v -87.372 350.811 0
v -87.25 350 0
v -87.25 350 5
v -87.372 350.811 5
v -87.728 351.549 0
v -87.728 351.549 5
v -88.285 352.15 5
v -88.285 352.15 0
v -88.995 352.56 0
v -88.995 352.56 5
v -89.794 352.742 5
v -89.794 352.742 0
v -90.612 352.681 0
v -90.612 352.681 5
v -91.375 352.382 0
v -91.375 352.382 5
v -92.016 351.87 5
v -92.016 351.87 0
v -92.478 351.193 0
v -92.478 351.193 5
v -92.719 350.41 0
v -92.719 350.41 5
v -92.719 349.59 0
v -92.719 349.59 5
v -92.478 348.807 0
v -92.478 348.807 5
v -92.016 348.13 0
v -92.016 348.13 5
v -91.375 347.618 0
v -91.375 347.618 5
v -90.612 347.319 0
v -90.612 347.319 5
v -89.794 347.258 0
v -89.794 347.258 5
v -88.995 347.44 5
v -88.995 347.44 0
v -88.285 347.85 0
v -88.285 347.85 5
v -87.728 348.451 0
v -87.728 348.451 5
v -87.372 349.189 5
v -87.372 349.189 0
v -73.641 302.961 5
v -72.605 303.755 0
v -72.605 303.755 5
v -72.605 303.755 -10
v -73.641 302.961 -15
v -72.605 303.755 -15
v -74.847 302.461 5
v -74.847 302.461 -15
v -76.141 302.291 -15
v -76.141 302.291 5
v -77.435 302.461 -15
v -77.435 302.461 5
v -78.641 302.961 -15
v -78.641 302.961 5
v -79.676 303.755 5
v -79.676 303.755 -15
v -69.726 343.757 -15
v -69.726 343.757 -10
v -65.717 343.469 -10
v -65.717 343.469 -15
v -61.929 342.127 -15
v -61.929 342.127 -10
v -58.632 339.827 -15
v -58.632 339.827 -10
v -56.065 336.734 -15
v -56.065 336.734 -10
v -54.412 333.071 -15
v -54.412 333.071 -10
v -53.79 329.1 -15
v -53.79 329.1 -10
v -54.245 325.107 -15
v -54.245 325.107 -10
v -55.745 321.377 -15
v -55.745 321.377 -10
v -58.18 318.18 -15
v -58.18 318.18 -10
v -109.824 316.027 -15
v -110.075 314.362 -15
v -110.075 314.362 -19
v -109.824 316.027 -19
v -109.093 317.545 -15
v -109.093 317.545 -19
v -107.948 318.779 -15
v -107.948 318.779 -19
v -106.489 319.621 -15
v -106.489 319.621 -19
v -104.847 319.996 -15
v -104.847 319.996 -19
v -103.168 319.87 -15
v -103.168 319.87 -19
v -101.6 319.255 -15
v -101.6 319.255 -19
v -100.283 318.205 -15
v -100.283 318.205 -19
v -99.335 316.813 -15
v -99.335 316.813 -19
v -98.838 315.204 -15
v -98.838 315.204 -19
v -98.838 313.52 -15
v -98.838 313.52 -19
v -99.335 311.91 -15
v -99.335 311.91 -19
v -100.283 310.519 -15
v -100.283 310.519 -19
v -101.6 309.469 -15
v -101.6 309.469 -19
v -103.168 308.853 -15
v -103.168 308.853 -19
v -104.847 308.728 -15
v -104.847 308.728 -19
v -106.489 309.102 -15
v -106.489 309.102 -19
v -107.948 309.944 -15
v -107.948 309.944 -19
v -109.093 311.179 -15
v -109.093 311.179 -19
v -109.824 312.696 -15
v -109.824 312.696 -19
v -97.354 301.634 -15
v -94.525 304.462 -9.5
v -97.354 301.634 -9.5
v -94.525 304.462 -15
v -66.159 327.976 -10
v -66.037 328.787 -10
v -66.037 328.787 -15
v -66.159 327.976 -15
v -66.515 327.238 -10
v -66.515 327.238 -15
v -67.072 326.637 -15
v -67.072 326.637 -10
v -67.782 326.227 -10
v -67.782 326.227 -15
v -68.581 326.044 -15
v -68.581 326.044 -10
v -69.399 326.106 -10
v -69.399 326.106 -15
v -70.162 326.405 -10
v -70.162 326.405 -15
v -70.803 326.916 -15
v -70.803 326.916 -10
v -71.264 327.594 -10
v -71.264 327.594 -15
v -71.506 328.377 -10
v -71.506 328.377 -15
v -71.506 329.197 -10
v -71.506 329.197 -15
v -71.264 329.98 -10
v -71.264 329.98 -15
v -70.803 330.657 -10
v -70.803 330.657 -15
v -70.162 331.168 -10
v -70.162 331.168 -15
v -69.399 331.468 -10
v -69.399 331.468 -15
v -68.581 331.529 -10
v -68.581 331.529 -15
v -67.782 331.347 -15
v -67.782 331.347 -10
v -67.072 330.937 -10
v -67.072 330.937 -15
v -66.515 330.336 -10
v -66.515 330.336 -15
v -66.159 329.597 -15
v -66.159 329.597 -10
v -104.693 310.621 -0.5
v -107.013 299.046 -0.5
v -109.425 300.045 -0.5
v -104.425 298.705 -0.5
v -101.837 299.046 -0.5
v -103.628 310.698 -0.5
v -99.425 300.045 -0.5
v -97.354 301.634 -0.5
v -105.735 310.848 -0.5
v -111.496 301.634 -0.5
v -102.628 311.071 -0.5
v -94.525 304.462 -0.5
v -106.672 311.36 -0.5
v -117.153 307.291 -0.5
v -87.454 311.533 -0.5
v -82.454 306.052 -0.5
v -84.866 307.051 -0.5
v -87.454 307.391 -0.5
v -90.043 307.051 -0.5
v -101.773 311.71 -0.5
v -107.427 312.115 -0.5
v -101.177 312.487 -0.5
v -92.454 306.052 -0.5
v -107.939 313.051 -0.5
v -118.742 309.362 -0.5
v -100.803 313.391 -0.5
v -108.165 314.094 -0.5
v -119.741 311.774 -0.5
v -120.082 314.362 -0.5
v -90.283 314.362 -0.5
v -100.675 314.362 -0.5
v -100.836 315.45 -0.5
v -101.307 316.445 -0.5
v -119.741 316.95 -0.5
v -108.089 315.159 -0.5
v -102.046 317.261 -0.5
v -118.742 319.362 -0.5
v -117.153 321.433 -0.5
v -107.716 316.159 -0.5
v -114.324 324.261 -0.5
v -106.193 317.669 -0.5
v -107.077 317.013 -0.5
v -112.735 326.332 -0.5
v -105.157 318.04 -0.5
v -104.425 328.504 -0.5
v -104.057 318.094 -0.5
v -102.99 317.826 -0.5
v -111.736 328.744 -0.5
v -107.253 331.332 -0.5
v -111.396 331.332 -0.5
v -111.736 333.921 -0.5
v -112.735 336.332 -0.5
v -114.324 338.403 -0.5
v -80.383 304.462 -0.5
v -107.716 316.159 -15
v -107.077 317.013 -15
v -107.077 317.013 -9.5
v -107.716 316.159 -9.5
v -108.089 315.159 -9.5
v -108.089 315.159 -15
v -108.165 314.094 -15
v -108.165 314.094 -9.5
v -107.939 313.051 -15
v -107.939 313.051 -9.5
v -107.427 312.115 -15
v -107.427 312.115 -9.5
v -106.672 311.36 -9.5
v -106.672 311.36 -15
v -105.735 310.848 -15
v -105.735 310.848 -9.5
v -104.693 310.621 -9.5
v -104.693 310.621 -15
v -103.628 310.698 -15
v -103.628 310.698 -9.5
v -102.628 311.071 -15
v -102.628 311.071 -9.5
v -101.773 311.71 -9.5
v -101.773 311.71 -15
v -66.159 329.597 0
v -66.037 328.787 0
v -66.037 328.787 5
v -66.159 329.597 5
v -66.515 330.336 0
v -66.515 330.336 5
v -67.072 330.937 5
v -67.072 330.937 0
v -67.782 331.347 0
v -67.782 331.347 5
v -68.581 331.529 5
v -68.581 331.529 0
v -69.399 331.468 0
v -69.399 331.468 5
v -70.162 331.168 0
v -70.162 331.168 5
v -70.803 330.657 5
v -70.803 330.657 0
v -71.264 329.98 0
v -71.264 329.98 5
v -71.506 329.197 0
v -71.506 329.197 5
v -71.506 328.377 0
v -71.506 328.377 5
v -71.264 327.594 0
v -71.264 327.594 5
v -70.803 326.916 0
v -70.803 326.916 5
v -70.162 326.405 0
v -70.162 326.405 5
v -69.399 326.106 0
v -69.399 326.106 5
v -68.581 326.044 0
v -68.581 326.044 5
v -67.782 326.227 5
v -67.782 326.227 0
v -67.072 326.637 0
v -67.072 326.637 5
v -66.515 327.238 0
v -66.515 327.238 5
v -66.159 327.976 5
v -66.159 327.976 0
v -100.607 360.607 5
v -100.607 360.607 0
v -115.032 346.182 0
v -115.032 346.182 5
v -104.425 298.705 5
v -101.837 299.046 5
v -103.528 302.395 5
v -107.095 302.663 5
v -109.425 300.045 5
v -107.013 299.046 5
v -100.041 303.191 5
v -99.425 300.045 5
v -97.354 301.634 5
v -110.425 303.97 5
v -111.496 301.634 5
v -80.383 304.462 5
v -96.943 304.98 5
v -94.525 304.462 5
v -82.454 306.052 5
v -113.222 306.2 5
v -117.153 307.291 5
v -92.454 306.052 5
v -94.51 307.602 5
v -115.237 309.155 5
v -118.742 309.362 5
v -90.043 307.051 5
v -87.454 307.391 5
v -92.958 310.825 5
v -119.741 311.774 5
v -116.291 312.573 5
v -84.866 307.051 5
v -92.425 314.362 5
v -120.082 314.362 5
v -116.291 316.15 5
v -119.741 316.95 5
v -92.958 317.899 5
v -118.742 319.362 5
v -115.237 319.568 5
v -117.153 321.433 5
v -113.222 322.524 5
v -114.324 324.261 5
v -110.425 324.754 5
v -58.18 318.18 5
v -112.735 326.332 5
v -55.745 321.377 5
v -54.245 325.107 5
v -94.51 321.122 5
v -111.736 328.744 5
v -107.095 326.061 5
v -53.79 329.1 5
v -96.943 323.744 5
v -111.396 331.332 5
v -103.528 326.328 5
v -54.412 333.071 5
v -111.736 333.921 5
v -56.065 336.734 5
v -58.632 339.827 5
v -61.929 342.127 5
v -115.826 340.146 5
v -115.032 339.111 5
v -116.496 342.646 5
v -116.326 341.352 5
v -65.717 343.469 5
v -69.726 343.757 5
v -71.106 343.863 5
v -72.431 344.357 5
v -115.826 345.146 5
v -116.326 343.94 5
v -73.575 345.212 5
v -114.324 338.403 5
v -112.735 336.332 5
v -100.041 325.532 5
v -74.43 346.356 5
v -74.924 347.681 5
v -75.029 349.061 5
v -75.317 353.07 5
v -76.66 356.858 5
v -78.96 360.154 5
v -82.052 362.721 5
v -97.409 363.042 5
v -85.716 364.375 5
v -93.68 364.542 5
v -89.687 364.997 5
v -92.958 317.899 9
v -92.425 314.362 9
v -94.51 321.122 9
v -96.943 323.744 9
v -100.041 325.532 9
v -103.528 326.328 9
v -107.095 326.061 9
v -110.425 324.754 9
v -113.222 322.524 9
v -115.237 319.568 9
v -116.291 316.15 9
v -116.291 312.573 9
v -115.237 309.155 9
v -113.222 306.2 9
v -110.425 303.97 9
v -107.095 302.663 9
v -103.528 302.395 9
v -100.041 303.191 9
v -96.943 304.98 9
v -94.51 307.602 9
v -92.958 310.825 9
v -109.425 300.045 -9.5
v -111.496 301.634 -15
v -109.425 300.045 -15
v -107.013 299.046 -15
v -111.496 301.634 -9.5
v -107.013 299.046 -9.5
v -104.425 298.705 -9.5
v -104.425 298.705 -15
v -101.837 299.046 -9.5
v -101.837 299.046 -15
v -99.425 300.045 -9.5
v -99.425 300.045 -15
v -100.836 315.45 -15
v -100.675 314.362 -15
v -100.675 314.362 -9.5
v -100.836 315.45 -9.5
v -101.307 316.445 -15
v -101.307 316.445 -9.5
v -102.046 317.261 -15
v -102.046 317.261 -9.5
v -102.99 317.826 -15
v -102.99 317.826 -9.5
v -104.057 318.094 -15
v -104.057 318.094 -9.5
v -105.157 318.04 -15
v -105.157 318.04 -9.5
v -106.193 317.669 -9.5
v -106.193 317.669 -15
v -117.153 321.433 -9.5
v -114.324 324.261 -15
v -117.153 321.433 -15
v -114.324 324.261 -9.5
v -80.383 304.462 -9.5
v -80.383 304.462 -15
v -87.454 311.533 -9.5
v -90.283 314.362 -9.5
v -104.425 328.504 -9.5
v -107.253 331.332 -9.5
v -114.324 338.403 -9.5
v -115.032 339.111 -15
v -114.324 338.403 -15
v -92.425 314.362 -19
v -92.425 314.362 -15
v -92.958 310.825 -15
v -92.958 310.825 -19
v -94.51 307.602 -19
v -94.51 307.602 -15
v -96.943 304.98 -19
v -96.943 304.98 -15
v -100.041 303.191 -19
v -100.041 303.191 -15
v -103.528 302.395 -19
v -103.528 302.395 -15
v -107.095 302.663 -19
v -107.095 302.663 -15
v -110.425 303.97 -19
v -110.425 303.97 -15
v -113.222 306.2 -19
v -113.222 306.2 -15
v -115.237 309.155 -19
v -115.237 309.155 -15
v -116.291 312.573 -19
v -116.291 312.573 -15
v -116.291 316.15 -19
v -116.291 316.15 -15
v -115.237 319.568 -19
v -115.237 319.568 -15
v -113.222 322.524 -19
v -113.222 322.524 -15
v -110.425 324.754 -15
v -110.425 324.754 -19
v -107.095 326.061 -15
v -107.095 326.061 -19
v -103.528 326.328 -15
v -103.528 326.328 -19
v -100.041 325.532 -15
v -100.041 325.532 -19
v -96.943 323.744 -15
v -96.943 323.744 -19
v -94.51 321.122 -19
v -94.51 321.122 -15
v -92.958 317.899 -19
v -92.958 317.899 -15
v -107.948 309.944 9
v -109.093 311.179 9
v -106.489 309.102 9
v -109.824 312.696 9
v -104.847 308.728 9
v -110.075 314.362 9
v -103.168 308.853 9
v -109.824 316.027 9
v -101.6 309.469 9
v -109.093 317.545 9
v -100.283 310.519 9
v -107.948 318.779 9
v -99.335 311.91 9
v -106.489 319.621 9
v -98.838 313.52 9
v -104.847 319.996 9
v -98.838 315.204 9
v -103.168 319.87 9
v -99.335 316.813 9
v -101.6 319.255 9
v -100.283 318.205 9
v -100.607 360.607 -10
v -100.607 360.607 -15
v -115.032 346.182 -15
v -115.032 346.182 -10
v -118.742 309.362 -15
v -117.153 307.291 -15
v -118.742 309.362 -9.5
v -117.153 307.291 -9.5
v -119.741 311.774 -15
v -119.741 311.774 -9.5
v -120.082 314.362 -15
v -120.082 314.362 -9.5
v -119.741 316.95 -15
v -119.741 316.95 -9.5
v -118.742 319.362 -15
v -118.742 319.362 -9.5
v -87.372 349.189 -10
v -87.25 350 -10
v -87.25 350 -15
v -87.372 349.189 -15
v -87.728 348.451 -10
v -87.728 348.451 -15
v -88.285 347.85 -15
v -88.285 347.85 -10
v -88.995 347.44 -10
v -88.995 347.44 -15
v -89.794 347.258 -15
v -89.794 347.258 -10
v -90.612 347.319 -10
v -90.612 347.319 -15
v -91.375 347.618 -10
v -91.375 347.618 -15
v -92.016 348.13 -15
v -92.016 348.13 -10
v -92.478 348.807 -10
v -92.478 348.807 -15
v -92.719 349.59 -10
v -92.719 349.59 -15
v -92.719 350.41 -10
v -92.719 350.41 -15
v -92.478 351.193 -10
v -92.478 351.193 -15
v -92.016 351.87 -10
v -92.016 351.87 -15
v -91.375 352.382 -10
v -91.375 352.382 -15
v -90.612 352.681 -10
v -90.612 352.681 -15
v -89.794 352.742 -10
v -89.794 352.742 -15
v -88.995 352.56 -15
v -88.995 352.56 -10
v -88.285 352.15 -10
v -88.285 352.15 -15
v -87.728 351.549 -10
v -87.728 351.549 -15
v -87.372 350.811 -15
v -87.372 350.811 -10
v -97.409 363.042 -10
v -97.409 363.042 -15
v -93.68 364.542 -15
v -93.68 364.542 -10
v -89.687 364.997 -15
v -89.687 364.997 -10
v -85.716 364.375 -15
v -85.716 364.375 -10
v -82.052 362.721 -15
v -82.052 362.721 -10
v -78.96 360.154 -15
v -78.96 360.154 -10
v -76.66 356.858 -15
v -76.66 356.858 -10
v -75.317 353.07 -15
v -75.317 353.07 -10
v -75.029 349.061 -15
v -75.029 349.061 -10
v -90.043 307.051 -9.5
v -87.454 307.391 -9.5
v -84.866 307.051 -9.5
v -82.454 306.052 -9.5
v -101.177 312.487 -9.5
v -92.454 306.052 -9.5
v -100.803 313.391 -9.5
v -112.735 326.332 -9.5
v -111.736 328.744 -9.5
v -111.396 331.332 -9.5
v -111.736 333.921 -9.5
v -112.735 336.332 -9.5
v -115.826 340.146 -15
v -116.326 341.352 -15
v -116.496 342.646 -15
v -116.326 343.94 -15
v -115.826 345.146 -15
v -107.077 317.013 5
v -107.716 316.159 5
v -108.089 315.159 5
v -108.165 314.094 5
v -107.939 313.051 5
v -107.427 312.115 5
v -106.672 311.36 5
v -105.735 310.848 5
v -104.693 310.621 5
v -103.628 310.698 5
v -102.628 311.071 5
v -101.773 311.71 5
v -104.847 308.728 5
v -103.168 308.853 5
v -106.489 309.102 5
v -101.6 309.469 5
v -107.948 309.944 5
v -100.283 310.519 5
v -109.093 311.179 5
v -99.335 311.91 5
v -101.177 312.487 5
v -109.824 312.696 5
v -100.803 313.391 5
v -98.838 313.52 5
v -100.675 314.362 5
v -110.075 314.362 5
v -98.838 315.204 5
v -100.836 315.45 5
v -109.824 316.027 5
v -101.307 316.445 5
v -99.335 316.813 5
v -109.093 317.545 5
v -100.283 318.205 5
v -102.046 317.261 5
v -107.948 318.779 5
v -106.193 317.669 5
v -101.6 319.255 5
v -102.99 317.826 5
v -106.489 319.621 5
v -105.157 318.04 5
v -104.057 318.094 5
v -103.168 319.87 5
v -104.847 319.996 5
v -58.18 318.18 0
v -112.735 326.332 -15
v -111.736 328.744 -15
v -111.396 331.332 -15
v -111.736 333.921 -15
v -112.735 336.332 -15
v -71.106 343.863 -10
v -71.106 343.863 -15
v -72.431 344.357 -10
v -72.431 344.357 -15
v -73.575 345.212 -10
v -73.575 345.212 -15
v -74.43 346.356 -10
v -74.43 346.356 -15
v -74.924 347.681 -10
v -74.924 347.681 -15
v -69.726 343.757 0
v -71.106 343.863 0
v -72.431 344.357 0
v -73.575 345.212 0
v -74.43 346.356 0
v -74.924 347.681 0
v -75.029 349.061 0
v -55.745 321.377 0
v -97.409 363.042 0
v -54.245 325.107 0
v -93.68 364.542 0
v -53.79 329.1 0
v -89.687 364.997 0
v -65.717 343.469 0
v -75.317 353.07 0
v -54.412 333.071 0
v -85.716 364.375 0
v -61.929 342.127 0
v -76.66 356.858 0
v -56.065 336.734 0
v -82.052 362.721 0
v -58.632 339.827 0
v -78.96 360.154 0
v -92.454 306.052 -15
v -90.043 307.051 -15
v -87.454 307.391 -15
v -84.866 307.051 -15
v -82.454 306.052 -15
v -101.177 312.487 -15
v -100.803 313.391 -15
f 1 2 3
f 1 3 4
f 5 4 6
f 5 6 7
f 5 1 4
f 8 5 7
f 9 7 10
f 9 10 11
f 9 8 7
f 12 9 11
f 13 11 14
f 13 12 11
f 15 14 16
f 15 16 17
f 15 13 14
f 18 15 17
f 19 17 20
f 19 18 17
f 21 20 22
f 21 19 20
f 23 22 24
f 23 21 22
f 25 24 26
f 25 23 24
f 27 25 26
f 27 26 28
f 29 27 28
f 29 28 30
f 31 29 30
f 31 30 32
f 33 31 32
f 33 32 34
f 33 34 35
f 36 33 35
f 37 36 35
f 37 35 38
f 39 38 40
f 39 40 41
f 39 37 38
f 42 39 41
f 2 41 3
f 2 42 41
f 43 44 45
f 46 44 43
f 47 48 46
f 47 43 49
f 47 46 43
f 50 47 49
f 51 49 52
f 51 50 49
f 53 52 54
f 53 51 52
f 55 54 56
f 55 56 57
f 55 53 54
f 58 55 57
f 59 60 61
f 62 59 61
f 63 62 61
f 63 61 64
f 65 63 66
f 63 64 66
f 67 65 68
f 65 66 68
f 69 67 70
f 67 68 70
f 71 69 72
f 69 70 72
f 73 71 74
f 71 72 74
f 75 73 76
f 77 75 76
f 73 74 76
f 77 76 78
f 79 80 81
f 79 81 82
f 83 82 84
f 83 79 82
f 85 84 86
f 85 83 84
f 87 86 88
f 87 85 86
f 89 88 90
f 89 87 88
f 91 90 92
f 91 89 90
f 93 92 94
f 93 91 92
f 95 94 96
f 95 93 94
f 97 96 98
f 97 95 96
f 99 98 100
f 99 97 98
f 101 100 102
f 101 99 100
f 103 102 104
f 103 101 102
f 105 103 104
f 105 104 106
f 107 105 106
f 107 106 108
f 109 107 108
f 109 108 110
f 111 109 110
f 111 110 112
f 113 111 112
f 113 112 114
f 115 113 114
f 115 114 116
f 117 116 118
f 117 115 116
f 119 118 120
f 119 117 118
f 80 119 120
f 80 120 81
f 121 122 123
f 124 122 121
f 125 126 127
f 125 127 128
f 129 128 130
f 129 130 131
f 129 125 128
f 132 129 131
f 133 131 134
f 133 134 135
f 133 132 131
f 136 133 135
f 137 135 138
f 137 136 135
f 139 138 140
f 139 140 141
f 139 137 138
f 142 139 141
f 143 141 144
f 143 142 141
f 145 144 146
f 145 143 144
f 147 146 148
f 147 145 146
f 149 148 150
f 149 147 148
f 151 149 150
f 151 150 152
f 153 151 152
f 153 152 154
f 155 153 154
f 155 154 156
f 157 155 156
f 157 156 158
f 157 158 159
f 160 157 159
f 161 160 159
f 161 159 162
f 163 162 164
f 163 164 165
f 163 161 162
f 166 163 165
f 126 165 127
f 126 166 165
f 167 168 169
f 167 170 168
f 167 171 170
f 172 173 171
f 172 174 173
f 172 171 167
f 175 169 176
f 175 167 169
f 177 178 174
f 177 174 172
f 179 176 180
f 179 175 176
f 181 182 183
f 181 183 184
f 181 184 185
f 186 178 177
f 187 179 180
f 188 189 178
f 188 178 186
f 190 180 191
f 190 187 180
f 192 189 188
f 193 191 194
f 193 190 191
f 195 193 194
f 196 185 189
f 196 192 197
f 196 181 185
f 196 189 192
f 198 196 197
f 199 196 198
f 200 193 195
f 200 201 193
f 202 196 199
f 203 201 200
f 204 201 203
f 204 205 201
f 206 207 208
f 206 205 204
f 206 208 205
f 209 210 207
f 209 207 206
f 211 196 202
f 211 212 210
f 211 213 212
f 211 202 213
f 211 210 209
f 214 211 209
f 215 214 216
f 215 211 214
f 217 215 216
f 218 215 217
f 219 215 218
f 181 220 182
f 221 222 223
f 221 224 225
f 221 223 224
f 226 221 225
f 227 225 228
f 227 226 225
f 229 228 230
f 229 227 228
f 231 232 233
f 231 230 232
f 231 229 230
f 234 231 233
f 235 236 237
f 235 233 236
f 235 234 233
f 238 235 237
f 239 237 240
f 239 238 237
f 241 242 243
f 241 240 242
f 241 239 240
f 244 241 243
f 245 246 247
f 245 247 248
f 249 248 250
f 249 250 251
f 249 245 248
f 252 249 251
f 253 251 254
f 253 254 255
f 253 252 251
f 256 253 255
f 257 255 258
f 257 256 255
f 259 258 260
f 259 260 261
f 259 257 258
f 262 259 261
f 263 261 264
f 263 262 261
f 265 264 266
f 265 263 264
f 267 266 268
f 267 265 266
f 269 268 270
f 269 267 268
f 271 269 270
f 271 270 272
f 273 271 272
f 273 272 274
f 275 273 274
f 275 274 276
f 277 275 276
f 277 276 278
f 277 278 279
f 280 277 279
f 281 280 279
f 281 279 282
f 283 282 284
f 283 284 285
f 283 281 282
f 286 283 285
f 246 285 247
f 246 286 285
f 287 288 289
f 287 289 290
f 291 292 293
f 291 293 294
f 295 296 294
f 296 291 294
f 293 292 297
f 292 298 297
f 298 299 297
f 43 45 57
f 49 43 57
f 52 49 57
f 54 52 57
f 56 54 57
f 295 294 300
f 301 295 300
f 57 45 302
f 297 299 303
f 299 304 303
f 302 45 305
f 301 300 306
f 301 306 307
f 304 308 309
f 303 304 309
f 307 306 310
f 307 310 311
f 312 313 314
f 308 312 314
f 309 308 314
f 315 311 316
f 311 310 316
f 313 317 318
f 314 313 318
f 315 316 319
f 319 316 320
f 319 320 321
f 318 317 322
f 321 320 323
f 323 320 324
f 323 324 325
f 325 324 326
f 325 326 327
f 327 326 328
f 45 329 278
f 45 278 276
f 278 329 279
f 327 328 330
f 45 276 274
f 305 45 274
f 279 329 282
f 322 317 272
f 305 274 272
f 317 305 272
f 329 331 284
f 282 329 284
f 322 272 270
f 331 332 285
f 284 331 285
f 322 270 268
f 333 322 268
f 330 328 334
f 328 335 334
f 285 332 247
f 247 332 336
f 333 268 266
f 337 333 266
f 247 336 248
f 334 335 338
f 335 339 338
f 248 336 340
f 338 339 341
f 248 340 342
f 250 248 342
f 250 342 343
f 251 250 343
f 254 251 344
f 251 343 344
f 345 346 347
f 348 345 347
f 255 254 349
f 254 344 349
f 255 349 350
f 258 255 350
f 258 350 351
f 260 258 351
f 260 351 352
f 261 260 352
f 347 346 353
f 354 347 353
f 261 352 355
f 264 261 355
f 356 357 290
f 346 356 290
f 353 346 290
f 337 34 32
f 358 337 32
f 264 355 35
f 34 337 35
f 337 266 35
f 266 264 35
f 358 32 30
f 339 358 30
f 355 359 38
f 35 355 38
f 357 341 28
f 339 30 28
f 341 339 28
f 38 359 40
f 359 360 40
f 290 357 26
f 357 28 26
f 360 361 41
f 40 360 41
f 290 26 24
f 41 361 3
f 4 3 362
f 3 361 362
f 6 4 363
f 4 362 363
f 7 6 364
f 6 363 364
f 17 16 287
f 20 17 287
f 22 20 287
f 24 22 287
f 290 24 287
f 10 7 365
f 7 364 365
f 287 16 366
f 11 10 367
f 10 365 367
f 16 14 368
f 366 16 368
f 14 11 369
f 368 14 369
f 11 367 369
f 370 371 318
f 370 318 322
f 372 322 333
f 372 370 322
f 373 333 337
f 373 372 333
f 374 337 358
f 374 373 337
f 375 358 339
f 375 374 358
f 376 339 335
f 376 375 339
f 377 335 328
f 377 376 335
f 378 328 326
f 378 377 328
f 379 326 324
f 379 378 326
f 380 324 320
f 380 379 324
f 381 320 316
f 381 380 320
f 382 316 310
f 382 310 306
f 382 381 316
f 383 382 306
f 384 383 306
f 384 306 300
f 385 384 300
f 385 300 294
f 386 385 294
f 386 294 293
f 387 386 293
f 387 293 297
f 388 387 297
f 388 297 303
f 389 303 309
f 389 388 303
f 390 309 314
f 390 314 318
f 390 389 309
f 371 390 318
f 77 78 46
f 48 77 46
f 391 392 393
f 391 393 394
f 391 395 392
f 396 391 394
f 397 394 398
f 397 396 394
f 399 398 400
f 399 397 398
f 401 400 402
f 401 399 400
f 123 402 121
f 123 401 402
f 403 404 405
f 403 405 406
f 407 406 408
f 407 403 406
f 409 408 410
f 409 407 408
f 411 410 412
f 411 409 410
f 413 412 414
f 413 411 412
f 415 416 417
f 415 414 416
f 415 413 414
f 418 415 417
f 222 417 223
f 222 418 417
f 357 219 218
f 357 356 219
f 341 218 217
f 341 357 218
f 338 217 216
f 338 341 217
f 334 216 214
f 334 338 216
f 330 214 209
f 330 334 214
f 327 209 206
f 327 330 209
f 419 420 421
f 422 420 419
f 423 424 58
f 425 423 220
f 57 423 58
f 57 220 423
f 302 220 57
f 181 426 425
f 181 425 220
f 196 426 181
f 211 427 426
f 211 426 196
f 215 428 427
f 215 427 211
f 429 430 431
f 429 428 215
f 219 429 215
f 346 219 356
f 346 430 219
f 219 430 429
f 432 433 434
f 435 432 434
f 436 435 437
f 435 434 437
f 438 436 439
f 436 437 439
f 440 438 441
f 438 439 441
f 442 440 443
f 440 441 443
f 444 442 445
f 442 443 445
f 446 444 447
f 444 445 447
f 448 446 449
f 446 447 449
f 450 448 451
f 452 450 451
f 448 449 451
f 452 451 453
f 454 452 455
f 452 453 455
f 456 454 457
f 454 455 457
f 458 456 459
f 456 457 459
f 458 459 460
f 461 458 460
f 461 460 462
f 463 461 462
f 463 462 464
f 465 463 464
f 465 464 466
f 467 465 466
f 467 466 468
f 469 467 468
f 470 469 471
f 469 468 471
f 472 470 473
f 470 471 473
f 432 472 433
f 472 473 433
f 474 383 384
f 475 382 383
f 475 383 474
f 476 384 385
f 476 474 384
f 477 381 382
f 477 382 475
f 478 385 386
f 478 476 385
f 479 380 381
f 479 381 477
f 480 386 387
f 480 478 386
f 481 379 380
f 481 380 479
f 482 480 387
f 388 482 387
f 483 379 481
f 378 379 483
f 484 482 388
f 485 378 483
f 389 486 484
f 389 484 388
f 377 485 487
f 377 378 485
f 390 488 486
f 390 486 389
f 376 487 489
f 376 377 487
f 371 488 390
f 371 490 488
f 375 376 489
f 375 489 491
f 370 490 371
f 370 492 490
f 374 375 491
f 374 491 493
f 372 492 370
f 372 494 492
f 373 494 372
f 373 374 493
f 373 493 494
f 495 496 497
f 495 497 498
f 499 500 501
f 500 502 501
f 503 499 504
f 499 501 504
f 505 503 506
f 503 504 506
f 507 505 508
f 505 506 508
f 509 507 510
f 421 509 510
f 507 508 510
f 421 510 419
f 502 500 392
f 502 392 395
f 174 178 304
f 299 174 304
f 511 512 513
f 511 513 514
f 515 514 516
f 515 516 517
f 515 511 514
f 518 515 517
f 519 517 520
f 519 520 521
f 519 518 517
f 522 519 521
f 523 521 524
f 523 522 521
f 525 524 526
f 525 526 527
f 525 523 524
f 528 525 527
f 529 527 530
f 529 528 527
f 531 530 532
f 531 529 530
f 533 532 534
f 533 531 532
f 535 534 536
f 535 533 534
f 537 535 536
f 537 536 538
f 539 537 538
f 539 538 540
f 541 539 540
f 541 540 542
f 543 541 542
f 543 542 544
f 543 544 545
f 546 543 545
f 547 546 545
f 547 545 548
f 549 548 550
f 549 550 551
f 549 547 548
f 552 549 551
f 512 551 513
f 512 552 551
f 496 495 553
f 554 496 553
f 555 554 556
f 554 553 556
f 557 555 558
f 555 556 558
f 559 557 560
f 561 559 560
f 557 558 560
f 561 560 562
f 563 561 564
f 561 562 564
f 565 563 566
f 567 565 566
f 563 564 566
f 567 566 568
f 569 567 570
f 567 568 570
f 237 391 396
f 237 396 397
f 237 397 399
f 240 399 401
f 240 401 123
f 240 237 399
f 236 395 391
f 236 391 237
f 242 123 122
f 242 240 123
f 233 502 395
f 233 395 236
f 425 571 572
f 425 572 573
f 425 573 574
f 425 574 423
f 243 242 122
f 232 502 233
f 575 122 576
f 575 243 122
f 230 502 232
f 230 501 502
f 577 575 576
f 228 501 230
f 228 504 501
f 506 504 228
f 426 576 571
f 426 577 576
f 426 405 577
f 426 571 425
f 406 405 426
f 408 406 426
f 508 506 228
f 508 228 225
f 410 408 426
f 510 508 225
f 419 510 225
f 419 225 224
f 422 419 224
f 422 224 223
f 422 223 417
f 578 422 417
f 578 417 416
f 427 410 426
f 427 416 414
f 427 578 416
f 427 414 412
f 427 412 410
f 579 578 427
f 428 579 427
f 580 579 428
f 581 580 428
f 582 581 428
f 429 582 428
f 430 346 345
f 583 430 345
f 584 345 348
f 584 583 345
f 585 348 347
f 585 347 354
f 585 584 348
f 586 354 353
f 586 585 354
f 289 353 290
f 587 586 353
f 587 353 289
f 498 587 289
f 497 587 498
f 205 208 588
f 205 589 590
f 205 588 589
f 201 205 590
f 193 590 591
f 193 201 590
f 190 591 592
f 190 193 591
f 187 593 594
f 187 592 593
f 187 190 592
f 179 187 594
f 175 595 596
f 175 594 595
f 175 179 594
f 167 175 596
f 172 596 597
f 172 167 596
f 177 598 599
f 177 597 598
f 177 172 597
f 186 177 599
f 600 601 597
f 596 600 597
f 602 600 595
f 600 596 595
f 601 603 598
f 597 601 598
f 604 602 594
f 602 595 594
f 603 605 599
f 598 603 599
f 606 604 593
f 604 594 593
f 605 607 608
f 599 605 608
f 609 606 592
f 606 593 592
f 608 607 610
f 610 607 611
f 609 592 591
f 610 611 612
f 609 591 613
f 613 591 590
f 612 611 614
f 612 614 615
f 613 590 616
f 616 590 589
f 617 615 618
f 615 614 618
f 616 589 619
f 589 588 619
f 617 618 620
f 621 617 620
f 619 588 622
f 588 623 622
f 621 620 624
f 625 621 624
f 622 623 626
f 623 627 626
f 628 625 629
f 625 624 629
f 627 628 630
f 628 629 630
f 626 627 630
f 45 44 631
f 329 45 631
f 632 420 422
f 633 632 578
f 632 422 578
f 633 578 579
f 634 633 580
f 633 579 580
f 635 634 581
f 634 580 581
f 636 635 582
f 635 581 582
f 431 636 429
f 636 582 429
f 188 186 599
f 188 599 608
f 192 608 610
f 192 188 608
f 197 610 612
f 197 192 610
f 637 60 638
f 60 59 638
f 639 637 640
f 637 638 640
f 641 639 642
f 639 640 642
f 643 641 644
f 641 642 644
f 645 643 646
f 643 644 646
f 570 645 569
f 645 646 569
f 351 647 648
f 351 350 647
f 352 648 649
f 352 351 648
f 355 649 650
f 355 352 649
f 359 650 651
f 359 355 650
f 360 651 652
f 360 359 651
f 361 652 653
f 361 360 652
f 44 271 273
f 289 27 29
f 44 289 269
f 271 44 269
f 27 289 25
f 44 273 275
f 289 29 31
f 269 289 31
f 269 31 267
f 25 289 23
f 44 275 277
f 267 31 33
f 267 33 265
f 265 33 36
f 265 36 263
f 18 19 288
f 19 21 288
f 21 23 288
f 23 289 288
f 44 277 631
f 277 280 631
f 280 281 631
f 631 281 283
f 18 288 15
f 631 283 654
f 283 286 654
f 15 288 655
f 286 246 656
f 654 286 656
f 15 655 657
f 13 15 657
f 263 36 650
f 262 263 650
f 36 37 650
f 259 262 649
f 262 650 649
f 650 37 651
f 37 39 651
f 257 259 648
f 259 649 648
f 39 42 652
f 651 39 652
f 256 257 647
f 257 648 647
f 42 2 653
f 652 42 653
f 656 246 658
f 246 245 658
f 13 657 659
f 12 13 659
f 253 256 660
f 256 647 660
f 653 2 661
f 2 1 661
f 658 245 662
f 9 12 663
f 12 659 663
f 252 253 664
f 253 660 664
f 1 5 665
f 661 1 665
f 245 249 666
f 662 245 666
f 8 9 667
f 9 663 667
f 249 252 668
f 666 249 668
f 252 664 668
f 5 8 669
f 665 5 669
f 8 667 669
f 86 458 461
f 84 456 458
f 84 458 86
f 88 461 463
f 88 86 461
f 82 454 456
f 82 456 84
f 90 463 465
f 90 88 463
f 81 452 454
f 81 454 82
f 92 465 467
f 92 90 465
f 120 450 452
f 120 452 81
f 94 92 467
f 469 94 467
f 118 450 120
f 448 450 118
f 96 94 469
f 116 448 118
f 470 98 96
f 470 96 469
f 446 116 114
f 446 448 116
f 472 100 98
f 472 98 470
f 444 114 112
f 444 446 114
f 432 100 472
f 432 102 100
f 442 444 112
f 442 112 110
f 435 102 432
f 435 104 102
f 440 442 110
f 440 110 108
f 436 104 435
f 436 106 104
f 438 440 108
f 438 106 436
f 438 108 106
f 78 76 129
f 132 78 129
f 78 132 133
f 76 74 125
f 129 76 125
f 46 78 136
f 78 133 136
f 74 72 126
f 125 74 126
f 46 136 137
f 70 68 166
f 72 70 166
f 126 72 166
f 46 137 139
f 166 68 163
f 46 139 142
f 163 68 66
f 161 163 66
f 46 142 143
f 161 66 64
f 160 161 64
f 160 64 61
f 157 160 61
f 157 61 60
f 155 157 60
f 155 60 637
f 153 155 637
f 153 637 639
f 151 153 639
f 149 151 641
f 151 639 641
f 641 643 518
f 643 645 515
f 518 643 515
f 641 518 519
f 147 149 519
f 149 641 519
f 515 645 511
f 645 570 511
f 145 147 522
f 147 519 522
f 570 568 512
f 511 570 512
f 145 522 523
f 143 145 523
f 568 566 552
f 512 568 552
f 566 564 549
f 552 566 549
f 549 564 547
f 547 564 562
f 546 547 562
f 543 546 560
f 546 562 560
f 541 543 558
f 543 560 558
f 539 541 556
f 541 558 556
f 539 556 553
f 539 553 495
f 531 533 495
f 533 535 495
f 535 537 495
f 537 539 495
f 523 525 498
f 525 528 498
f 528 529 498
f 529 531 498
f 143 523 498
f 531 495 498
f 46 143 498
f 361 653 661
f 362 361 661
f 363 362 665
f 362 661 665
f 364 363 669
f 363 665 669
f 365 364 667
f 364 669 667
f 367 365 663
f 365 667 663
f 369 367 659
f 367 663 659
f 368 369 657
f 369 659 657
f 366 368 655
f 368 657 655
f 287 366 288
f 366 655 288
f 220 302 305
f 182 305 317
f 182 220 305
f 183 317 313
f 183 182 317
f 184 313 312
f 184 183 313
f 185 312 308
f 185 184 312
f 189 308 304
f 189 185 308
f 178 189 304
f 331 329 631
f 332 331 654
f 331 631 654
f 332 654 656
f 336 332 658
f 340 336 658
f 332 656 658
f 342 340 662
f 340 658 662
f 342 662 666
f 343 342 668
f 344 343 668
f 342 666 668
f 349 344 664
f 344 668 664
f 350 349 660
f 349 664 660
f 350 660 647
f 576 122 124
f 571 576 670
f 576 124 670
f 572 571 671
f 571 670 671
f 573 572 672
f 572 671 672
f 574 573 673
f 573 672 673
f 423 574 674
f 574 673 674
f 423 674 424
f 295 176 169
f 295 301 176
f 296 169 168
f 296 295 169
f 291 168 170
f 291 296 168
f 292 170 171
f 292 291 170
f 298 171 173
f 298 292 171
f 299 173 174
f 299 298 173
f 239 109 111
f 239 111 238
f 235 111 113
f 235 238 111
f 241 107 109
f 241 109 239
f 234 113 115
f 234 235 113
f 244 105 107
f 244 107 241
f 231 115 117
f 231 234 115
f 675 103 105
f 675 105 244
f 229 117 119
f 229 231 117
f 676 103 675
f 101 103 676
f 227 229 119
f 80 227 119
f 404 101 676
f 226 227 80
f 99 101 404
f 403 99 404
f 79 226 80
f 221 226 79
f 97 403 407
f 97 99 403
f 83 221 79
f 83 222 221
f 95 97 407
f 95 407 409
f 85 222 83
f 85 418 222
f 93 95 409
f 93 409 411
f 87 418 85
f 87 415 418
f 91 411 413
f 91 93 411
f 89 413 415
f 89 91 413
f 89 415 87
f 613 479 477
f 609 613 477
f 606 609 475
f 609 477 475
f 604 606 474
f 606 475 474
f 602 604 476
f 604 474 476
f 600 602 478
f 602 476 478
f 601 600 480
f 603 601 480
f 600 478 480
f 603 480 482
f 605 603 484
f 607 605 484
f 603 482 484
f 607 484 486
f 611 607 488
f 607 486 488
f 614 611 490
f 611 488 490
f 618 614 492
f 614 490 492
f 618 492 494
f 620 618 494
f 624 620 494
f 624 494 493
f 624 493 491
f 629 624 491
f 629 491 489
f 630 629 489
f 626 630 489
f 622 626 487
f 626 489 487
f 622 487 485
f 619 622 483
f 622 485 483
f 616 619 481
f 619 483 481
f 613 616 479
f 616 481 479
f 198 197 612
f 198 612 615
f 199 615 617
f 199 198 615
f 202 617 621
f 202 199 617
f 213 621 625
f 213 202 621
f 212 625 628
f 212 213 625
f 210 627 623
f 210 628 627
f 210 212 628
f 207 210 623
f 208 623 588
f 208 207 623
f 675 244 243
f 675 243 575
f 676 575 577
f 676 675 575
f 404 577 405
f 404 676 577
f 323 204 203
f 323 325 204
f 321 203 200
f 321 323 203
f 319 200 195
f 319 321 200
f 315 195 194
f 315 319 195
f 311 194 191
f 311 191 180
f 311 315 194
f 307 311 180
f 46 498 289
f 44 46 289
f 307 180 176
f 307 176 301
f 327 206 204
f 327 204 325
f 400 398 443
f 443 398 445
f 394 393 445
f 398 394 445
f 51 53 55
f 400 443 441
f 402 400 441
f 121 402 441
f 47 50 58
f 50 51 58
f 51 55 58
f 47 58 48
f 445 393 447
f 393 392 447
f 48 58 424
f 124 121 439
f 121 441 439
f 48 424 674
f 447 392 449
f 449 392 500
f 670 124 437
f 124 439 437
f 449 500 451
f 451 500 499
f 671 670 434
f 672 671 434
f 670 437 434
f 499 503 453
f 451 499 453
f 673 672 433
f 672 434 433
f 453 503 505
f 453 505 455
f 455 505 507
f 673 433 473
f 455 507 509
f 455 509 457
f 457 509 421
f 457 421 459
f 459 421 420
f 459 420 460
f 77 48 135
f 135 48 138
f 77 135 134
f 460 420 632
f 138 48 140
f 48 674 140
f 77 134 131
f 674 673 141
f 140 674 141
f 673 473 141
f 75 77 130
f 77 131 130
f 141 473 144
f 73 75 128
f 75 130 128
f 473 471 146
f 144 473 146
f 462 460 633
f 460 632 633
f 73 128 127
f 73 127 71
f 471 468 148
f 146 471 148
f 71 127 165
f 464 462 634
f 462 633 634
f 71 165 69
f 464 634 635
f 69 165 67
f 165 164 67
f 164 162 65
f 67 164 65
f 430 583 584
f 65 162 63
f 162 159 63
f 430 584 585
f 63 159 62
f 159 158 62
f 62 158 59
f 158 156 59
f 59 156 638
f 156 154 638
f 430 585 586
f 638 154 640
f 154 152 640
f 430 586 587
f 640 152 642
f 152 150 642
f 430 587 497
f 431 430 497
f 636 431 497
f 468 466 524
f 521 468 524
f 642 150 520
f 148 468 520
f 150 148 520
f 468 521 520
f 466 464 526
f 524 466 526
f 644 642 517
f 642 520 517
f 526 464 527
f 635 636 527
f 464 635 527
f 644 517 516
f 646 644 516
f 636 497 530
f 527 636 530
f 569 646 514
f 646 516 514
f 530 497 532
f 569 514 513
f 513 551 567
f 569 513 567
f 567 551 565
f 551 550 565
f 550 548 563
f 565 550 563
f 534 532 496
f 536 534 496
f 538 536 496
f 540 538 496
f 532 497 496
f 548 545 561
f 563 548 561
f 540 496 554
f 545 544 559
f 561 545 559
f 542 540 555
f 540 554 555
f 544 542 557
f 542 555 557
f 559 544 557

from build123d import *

# Parameters (mm, degrees)
SKETCH2_R               = 2.75
BOSS_EXTRUDE2_DEPTH     = 5
SKETCH3_R               = 2.75
BOSS_EXTRUDE3_DEPTH     = 5
SKETCH4_W               = 20
SKETCH4_H               = 60
BOSS_EXTRUDE4_DEPTH     = 5
FILLET1_R               = 5
SKETCH5_W               = 8
SKETCH5_H               = 10
BOSS_EXTRUDE5_DEPTH     = 20
FILLET3_START           = -16
FILLET3_DEPTH           = 22
CUT_EXTRUDE1_DEPTH      = 385.295668221
CUT_EXTRUDE1_DEPTH_BACK = 385.295668221
SKETCH8_R               = 9
SKETCH8_R_2             = 5.65
BOSS_EXTRUDE6_DEPTH     = 4
BOSS_EXTRUDE7_START     = 4
SKETCH9_R               = 9
SKETCH9_R_2             = 5.65
BOSS_EXTRUDE7_DEPTH     = 4
CUT_EXTRUDE2_DEPTH      = 2.5
CUT_EXTRUDE3_DEPTH      = 2.5
SKETCH12_W              = 5.5
SKETCH12_H              = 20
BOSS_EXTRUDE8_DEPTH     = 4
SKETCH13_W              = 5.5
SKETCH13_H              = 20
BOSS_EXTRUDE9_DEPTH     = 4
SKETCH14_W              = 5.5
SKETCH14_H              = 28
BOSS_EXTRUDE10_DEPTH    = 4
FILLET4_R               = 10
SKETCH16_R              = 12
SKETCH16_R_2            = 5.65
BOSS_EXTRUDE11_DEPTH    = 4
BOSS_EXTRUDE12_START    = 4
SKETCH17_R              = 12
SKETCH17_R_2            = 5.65
BOSS_EXTRUDE12_DEPTH    = 4


with BuildPart() as part:
    # Sketch2 → Boss-Extrude2 (new body)
    with BuildSketch(Plane.XY):
        with BuildLine():
            ThreePointArc((-79.393398282, 339.393398282), (-79.393398282, 360.606601718), (-100.606601718, 360.606601718))
            Line((-100.606601718, 360.606601718), (-115.031580054, 346.181623382))
            Line((-115.031580054, 346.181623382), (-72.605173183, 303.75521651))
            Line((-72.605173183, 303.75521651), (-58.180194847, 318.180194847))
            ThreePointArc((-58.180194847, 318.180194847), (-58.180194847, 339.393398282), (-79.393398282, 339.393398282))
        make_face()
        with Locations((-90, 350)):
            Circle(SKETCH2_R, mode=Mode.SUBTRACT)
        with Locations((-68.786796564, 328.786796564)):
            Circle(SKETCH2_R, mode=Mode.SUBTRACT)
    extrude(amount=BOSS_EXTRUDE2_DEPTH)



with BuildPart() as body_2:
    # Sketch3 → Boss-Extrude3 (new body)
    with BuildSketch(Plane(origin=(0, 0, -10), x_dir=(-1, 0, 0), z_dir=(0, 0, -1))):
        with BuildLine():
            Line((72.605173183, 303.75521651), (115.031580054, 346.181623382))
            Line((115.031580054, 346.181623382), (100.606601718, 360.606601718))
            ThreePointArc((100.606601718, 360.606601718), (79.393398282, 360.606601718), (79.393398282, 339.393398282))
            ThreePointArc((79.393398282, 339.393398282), (58.180194847, 339.393398282), (58.180194847, 318.180194847))
            Line((58.180194847, 318.180194847), (72.605173183, 303.75521651))
        make_face()
        with Locations(Location((90, 350, 0), (0, 0, 180))):
            Circle(SKETCH3_R, mode=Mode.SUBTRACT)
        with Locations(Location((68.786796564, 328.786796564, 0), (0, 0, 180))):
            Circle(SKETCH3_R, mode=Mode.SUBTRACT)
    extrude(amount=BOSS_EXTRUDE3_DEPTH)


with BuildPart() as part_1:
    add(part.part)

    add(body_2.part)  # Boss-Extrude4 merges body 2
    # Sketch4 → Boss-Extrude4 (add)
    with BuildSketch(Plane(origin=(115.575021664, 115.575021664, 0), x_dir=(0, 0, 1), z_dir=(-0.7071067811865471, -0.707106781186548, 0))):
        with Locations((-5, 296.126983722)):
            Rectangle(SKETCH4_W, SKETCH4_H)
    extrude(amount=BOSS_EXTRUDE4_DEPTH)

    # Fillet1
    fillet1_edges = [part_1.edges().sort_by_distance(p)[0] for p in [
        (-79.393398282, 339.393398282, 2.5),
        (-79.393398282, 339.393398282, -12.5),
    ]]
    fillet(fillet1_edges, radius=FILLET1_R)

    # Sketch5 → Boss-Extrude5 (add)
    with BuildSketch(Plane(origin=(112.039487758, 112.039487758, 0), x_dir=(0, 0, 1), z_dir=(-0.7071067811865477, -0.7071067811865475, 0))):
        with Locations((1, 301.126983722)):
            Rectangle(SKETCH5_W, SKETCH5_H)
        with Locations((-11, 301.126983722)):
            Rectangle(SKETCH5_W, SKETCH5_H)
        with Locations((-11, 291.126983722)):
            Rectangle(SKETCH5_W, SKETCH5_H)
        with Locations((1, 291.126983722)):
            Rectangle(SKETCH5_W, SKETCH5_H)
    extrude(amount=BOSS_EXTRUDE5_DEPTH)

    # Fillet3: read off the stored shape, not the designer's step
    # Fillet3 outline → Fillet3 (cut)
    with BuildSketch(Plane.XY.offset(FILLET3_START)):
        with BuildLine():
            Line((-118.56711396, 342.646089476), (-115.031580054, 339.11055557))
            ThreePointArc((-115.031580054, 339.11055557), (-116.496046148, 342.646089476), (-115.031580054, 346.181623382))
            Line((-115.031580054, 346.181623382), (-118.56711396, 342.646089476))
        make_face()
        with BuildLine():
            ThreePointArc((-72.605173183, 303.75521651), (-76.140707089, 302.290750416), (-79.676240995, 303.75521651))
            Line((-79.676240995, 303.75521651), (-76.140707089, 300.219682604))
            Line((-76.140707089, 300.219682604), (-72.605173183, 303.75521651))
        make_face()
    extrude(amount=FILLET3_DEPTH, mode=Mode.SUBTRACT)

    # Sketch7 → Cut-Extrude1 (cut, two sides: drawn at the far end of the back side and taken through both)
    with BuildSketch(Plane.XY.offset(5).offset(-CUT_EXTRUDE1_DEPTH_BACK)):
        with BuildLine():
            ThreePointArc((-100.674978336, 314.361818228), (-102.989915465, 317.826366475), (-107.076628766, 317.013468658))
            Line((-107.076628766, 317.013468658), (-101.773327907, 311.710167799))
            ThreePointArc((-101.773327907, 311.710167799), (-100.960430089, 312.926755357), (-100.674978336, 314.361818228))
        make_face()
        with BuildLine():
            Line((-101.773327907, 311.710167799), (-107.076628766, 317.013468658))
            ThreePointArc((-107.076628766, 317.013468658), (-107.076628766, 311.710167799), (-101.773327907, 311.710167799))
        make_face()
    extrude(amount=CUT_EXTRUDE1_DEPTH + CUT_EXTRUDE1_DEPTH_BACK, mode=Mode.SUBTRACT)

    # Sketch8 → Boss-Extrude6 (add)
    with BuildSketch(Plane(origin=(0, 0, -15), x_dir=(-1, 0, 0), z_dir=(0, 0, -1))):
        with Locations((104.424978336, 314.361818228)):
            Circle(SKETCH8_R)
        with Locations((104.424978336, 314.361818228)):
            Circle(SKETCH8_R_2, mode=Mode.SUBTRACT)
    extrude(amount=BOSS_EXTRUDE6_DEPTH)

    # Sketch9 → Boss-Extrude7 (add)
    with BuildSketch(Plane.XY.offset(5).offset(BOSS_EXTRUDE7_START)):
        with Locations(Location((-104.424978336, 314.361818228, 0), (0, 0, 180))):
            Circle(SKETCH9_R)
        with Locations(Location((-104.424978336, 314.361818228, 0), (0, 0, 180))):
            Circle(SKETCH9_R_2, mode=Mode.SUBTRACT)
    extrude(amount=-BOSS_EXTRUDE7_DEPTH)

    # Sketch10 → Cut-Extrude2 (cut)
    with BuildSketch(Plane.XY.offset(-7)):
        Polygon((-118.56711396, 314.361818228), (-104.424978336, 300.219682604), (-90.282842712, 314.361818228), (-104.424978336, 328.503953852), align=None)
    extrude(amount=-CUT_EXTRUDE2_DEPTH, mode=Mode.SUBTRACT)

    # Sketch11 → Cut-Extrude3 (cut)
    with BuildSketch(Plane(origin=(0, 0, -3), x_dir=(-1, 0, 0), z_dir=(0, 0, -1))):
        Polygon((90.282842712, 314.361818228), (104.424978336, 300.219682604), (118.56711396, 314.361818228), (104.424978336, 328.503953852), align=None)
    extrude(amount=-CUT_EXTRUDE3_DEPTH, mode=Mode.SUBTRACT)

    # Sketch12 → Boss-Extrude8 (add)
    with BuildSketch(Plane(origin=(-216.464466094, 216.464466094, 0), x_dir=(0, 0, 1), z_dir=(-0.7071067811865476, 0.7071067811865476, 0))):
        with Locations((-12.25, 148.447763109)):
            Rectangle(SKETCH12_W, SKETCH12_H)
        with Locations((2.25, 148.447763109)):
            Rectangle(SKETCH12_W, SKETCH12_H)
    extrude(amount=BOSS_EXTRUDE8_DEPTH)

    # Sketch13 → Boss-Extrude9 (add)
    with BuildSketch(Plane(origin=(-202.32233047, 202.32233047, 0), x_dir=(0, 0, -1), z_dir=(0.7071067811865476, -0.7071067811865476, 0))):
        with Locations((12.25, 148.447763109)):
            Rectangle(SKETCH13_W, SKETCH13_H)
        with Locations((-2.25, 148.447763109)):
            Rectangle(SKETCH13_W, SKETCH13_H)
    extrude(amount=BOSS_EXTRUDE9_DEPTH)

    # Sketch14 → Boss-Extrude10 (add)
    with BuildSketch(Plane(origin=(97.897352134, 97.897352134, 0), x_dir=(0, 0, 1), z_dir=(-0.7071067811865476, -0.7071067811865476, 0))):
        with Locations((2.25, 296.126983722)):
            Rectangle(SKETCH14_W, SKETCH14_H)
        with Locations((-12.25, 296.126983722)):
            Rectangle(SKETCH14_W, SKETCH14_H)
    extrude(amount=BOSS_EXTRUDE10_DEPTH)

    # Fillet4
    fillet4_edges = [part_1.edges().sort_by_distance(p)[0] for p in [
        (-107.253405461, 331.332380977, -12.25),
        (-107.253405461, 331.332380977, 2.25),
        (-87.454415588, 311.533391103, -12.25),
        (-87.454415588, 311.533391103, 2.25),
        (-104.424978336, 294.562828355, 2.25),
        (-124.223968209, 314.361818228, 2.25),
        (-124.223968209, 314.361818228, -12.25),
        (-104.424978336, 294.562828355, -12.25),
    ]]
    fillet(fillet4_edges, radius=FILLET4_R)

    # Sketch16 → Boss-Extrude11 (add)
    with BuildSketch(Plane(origin=(0, 0, -15), x_dir=(-1, 0, 0), z_dir=(0, 0, -1))):
        with Locations(Location((104.424978336, 314.361818228, 0), (0, 0, 180))):
            Circle(SKETCH16_R)
        with Locations((104.424978336, 314.361818228)):
            Circle(SKETCH16_R_2, mode=Mode.SUBTRACT)
    extrude(amount=BOSS_EXTRUDE11_DEPTH)

    # Sketch17 → Boss-Extrude12 (add)
    with BuildSketch(Plane.XY.offset(5).offset(BOSS_EXTRUDE12_START)):
        with Locations((-104.424978336, 314.361818228)):
            Circle(SKETCH17_R)
        with Locations(Location((-104.424978336, 314.361818228, 0), (0, 0, 180))):
            Circle(SKETCH17_R_2, mode=Mode.SUBTRACT)
    extrude(amount=-BOSS_EXTRUDE12_DEPTH)


solid = part_1.part
